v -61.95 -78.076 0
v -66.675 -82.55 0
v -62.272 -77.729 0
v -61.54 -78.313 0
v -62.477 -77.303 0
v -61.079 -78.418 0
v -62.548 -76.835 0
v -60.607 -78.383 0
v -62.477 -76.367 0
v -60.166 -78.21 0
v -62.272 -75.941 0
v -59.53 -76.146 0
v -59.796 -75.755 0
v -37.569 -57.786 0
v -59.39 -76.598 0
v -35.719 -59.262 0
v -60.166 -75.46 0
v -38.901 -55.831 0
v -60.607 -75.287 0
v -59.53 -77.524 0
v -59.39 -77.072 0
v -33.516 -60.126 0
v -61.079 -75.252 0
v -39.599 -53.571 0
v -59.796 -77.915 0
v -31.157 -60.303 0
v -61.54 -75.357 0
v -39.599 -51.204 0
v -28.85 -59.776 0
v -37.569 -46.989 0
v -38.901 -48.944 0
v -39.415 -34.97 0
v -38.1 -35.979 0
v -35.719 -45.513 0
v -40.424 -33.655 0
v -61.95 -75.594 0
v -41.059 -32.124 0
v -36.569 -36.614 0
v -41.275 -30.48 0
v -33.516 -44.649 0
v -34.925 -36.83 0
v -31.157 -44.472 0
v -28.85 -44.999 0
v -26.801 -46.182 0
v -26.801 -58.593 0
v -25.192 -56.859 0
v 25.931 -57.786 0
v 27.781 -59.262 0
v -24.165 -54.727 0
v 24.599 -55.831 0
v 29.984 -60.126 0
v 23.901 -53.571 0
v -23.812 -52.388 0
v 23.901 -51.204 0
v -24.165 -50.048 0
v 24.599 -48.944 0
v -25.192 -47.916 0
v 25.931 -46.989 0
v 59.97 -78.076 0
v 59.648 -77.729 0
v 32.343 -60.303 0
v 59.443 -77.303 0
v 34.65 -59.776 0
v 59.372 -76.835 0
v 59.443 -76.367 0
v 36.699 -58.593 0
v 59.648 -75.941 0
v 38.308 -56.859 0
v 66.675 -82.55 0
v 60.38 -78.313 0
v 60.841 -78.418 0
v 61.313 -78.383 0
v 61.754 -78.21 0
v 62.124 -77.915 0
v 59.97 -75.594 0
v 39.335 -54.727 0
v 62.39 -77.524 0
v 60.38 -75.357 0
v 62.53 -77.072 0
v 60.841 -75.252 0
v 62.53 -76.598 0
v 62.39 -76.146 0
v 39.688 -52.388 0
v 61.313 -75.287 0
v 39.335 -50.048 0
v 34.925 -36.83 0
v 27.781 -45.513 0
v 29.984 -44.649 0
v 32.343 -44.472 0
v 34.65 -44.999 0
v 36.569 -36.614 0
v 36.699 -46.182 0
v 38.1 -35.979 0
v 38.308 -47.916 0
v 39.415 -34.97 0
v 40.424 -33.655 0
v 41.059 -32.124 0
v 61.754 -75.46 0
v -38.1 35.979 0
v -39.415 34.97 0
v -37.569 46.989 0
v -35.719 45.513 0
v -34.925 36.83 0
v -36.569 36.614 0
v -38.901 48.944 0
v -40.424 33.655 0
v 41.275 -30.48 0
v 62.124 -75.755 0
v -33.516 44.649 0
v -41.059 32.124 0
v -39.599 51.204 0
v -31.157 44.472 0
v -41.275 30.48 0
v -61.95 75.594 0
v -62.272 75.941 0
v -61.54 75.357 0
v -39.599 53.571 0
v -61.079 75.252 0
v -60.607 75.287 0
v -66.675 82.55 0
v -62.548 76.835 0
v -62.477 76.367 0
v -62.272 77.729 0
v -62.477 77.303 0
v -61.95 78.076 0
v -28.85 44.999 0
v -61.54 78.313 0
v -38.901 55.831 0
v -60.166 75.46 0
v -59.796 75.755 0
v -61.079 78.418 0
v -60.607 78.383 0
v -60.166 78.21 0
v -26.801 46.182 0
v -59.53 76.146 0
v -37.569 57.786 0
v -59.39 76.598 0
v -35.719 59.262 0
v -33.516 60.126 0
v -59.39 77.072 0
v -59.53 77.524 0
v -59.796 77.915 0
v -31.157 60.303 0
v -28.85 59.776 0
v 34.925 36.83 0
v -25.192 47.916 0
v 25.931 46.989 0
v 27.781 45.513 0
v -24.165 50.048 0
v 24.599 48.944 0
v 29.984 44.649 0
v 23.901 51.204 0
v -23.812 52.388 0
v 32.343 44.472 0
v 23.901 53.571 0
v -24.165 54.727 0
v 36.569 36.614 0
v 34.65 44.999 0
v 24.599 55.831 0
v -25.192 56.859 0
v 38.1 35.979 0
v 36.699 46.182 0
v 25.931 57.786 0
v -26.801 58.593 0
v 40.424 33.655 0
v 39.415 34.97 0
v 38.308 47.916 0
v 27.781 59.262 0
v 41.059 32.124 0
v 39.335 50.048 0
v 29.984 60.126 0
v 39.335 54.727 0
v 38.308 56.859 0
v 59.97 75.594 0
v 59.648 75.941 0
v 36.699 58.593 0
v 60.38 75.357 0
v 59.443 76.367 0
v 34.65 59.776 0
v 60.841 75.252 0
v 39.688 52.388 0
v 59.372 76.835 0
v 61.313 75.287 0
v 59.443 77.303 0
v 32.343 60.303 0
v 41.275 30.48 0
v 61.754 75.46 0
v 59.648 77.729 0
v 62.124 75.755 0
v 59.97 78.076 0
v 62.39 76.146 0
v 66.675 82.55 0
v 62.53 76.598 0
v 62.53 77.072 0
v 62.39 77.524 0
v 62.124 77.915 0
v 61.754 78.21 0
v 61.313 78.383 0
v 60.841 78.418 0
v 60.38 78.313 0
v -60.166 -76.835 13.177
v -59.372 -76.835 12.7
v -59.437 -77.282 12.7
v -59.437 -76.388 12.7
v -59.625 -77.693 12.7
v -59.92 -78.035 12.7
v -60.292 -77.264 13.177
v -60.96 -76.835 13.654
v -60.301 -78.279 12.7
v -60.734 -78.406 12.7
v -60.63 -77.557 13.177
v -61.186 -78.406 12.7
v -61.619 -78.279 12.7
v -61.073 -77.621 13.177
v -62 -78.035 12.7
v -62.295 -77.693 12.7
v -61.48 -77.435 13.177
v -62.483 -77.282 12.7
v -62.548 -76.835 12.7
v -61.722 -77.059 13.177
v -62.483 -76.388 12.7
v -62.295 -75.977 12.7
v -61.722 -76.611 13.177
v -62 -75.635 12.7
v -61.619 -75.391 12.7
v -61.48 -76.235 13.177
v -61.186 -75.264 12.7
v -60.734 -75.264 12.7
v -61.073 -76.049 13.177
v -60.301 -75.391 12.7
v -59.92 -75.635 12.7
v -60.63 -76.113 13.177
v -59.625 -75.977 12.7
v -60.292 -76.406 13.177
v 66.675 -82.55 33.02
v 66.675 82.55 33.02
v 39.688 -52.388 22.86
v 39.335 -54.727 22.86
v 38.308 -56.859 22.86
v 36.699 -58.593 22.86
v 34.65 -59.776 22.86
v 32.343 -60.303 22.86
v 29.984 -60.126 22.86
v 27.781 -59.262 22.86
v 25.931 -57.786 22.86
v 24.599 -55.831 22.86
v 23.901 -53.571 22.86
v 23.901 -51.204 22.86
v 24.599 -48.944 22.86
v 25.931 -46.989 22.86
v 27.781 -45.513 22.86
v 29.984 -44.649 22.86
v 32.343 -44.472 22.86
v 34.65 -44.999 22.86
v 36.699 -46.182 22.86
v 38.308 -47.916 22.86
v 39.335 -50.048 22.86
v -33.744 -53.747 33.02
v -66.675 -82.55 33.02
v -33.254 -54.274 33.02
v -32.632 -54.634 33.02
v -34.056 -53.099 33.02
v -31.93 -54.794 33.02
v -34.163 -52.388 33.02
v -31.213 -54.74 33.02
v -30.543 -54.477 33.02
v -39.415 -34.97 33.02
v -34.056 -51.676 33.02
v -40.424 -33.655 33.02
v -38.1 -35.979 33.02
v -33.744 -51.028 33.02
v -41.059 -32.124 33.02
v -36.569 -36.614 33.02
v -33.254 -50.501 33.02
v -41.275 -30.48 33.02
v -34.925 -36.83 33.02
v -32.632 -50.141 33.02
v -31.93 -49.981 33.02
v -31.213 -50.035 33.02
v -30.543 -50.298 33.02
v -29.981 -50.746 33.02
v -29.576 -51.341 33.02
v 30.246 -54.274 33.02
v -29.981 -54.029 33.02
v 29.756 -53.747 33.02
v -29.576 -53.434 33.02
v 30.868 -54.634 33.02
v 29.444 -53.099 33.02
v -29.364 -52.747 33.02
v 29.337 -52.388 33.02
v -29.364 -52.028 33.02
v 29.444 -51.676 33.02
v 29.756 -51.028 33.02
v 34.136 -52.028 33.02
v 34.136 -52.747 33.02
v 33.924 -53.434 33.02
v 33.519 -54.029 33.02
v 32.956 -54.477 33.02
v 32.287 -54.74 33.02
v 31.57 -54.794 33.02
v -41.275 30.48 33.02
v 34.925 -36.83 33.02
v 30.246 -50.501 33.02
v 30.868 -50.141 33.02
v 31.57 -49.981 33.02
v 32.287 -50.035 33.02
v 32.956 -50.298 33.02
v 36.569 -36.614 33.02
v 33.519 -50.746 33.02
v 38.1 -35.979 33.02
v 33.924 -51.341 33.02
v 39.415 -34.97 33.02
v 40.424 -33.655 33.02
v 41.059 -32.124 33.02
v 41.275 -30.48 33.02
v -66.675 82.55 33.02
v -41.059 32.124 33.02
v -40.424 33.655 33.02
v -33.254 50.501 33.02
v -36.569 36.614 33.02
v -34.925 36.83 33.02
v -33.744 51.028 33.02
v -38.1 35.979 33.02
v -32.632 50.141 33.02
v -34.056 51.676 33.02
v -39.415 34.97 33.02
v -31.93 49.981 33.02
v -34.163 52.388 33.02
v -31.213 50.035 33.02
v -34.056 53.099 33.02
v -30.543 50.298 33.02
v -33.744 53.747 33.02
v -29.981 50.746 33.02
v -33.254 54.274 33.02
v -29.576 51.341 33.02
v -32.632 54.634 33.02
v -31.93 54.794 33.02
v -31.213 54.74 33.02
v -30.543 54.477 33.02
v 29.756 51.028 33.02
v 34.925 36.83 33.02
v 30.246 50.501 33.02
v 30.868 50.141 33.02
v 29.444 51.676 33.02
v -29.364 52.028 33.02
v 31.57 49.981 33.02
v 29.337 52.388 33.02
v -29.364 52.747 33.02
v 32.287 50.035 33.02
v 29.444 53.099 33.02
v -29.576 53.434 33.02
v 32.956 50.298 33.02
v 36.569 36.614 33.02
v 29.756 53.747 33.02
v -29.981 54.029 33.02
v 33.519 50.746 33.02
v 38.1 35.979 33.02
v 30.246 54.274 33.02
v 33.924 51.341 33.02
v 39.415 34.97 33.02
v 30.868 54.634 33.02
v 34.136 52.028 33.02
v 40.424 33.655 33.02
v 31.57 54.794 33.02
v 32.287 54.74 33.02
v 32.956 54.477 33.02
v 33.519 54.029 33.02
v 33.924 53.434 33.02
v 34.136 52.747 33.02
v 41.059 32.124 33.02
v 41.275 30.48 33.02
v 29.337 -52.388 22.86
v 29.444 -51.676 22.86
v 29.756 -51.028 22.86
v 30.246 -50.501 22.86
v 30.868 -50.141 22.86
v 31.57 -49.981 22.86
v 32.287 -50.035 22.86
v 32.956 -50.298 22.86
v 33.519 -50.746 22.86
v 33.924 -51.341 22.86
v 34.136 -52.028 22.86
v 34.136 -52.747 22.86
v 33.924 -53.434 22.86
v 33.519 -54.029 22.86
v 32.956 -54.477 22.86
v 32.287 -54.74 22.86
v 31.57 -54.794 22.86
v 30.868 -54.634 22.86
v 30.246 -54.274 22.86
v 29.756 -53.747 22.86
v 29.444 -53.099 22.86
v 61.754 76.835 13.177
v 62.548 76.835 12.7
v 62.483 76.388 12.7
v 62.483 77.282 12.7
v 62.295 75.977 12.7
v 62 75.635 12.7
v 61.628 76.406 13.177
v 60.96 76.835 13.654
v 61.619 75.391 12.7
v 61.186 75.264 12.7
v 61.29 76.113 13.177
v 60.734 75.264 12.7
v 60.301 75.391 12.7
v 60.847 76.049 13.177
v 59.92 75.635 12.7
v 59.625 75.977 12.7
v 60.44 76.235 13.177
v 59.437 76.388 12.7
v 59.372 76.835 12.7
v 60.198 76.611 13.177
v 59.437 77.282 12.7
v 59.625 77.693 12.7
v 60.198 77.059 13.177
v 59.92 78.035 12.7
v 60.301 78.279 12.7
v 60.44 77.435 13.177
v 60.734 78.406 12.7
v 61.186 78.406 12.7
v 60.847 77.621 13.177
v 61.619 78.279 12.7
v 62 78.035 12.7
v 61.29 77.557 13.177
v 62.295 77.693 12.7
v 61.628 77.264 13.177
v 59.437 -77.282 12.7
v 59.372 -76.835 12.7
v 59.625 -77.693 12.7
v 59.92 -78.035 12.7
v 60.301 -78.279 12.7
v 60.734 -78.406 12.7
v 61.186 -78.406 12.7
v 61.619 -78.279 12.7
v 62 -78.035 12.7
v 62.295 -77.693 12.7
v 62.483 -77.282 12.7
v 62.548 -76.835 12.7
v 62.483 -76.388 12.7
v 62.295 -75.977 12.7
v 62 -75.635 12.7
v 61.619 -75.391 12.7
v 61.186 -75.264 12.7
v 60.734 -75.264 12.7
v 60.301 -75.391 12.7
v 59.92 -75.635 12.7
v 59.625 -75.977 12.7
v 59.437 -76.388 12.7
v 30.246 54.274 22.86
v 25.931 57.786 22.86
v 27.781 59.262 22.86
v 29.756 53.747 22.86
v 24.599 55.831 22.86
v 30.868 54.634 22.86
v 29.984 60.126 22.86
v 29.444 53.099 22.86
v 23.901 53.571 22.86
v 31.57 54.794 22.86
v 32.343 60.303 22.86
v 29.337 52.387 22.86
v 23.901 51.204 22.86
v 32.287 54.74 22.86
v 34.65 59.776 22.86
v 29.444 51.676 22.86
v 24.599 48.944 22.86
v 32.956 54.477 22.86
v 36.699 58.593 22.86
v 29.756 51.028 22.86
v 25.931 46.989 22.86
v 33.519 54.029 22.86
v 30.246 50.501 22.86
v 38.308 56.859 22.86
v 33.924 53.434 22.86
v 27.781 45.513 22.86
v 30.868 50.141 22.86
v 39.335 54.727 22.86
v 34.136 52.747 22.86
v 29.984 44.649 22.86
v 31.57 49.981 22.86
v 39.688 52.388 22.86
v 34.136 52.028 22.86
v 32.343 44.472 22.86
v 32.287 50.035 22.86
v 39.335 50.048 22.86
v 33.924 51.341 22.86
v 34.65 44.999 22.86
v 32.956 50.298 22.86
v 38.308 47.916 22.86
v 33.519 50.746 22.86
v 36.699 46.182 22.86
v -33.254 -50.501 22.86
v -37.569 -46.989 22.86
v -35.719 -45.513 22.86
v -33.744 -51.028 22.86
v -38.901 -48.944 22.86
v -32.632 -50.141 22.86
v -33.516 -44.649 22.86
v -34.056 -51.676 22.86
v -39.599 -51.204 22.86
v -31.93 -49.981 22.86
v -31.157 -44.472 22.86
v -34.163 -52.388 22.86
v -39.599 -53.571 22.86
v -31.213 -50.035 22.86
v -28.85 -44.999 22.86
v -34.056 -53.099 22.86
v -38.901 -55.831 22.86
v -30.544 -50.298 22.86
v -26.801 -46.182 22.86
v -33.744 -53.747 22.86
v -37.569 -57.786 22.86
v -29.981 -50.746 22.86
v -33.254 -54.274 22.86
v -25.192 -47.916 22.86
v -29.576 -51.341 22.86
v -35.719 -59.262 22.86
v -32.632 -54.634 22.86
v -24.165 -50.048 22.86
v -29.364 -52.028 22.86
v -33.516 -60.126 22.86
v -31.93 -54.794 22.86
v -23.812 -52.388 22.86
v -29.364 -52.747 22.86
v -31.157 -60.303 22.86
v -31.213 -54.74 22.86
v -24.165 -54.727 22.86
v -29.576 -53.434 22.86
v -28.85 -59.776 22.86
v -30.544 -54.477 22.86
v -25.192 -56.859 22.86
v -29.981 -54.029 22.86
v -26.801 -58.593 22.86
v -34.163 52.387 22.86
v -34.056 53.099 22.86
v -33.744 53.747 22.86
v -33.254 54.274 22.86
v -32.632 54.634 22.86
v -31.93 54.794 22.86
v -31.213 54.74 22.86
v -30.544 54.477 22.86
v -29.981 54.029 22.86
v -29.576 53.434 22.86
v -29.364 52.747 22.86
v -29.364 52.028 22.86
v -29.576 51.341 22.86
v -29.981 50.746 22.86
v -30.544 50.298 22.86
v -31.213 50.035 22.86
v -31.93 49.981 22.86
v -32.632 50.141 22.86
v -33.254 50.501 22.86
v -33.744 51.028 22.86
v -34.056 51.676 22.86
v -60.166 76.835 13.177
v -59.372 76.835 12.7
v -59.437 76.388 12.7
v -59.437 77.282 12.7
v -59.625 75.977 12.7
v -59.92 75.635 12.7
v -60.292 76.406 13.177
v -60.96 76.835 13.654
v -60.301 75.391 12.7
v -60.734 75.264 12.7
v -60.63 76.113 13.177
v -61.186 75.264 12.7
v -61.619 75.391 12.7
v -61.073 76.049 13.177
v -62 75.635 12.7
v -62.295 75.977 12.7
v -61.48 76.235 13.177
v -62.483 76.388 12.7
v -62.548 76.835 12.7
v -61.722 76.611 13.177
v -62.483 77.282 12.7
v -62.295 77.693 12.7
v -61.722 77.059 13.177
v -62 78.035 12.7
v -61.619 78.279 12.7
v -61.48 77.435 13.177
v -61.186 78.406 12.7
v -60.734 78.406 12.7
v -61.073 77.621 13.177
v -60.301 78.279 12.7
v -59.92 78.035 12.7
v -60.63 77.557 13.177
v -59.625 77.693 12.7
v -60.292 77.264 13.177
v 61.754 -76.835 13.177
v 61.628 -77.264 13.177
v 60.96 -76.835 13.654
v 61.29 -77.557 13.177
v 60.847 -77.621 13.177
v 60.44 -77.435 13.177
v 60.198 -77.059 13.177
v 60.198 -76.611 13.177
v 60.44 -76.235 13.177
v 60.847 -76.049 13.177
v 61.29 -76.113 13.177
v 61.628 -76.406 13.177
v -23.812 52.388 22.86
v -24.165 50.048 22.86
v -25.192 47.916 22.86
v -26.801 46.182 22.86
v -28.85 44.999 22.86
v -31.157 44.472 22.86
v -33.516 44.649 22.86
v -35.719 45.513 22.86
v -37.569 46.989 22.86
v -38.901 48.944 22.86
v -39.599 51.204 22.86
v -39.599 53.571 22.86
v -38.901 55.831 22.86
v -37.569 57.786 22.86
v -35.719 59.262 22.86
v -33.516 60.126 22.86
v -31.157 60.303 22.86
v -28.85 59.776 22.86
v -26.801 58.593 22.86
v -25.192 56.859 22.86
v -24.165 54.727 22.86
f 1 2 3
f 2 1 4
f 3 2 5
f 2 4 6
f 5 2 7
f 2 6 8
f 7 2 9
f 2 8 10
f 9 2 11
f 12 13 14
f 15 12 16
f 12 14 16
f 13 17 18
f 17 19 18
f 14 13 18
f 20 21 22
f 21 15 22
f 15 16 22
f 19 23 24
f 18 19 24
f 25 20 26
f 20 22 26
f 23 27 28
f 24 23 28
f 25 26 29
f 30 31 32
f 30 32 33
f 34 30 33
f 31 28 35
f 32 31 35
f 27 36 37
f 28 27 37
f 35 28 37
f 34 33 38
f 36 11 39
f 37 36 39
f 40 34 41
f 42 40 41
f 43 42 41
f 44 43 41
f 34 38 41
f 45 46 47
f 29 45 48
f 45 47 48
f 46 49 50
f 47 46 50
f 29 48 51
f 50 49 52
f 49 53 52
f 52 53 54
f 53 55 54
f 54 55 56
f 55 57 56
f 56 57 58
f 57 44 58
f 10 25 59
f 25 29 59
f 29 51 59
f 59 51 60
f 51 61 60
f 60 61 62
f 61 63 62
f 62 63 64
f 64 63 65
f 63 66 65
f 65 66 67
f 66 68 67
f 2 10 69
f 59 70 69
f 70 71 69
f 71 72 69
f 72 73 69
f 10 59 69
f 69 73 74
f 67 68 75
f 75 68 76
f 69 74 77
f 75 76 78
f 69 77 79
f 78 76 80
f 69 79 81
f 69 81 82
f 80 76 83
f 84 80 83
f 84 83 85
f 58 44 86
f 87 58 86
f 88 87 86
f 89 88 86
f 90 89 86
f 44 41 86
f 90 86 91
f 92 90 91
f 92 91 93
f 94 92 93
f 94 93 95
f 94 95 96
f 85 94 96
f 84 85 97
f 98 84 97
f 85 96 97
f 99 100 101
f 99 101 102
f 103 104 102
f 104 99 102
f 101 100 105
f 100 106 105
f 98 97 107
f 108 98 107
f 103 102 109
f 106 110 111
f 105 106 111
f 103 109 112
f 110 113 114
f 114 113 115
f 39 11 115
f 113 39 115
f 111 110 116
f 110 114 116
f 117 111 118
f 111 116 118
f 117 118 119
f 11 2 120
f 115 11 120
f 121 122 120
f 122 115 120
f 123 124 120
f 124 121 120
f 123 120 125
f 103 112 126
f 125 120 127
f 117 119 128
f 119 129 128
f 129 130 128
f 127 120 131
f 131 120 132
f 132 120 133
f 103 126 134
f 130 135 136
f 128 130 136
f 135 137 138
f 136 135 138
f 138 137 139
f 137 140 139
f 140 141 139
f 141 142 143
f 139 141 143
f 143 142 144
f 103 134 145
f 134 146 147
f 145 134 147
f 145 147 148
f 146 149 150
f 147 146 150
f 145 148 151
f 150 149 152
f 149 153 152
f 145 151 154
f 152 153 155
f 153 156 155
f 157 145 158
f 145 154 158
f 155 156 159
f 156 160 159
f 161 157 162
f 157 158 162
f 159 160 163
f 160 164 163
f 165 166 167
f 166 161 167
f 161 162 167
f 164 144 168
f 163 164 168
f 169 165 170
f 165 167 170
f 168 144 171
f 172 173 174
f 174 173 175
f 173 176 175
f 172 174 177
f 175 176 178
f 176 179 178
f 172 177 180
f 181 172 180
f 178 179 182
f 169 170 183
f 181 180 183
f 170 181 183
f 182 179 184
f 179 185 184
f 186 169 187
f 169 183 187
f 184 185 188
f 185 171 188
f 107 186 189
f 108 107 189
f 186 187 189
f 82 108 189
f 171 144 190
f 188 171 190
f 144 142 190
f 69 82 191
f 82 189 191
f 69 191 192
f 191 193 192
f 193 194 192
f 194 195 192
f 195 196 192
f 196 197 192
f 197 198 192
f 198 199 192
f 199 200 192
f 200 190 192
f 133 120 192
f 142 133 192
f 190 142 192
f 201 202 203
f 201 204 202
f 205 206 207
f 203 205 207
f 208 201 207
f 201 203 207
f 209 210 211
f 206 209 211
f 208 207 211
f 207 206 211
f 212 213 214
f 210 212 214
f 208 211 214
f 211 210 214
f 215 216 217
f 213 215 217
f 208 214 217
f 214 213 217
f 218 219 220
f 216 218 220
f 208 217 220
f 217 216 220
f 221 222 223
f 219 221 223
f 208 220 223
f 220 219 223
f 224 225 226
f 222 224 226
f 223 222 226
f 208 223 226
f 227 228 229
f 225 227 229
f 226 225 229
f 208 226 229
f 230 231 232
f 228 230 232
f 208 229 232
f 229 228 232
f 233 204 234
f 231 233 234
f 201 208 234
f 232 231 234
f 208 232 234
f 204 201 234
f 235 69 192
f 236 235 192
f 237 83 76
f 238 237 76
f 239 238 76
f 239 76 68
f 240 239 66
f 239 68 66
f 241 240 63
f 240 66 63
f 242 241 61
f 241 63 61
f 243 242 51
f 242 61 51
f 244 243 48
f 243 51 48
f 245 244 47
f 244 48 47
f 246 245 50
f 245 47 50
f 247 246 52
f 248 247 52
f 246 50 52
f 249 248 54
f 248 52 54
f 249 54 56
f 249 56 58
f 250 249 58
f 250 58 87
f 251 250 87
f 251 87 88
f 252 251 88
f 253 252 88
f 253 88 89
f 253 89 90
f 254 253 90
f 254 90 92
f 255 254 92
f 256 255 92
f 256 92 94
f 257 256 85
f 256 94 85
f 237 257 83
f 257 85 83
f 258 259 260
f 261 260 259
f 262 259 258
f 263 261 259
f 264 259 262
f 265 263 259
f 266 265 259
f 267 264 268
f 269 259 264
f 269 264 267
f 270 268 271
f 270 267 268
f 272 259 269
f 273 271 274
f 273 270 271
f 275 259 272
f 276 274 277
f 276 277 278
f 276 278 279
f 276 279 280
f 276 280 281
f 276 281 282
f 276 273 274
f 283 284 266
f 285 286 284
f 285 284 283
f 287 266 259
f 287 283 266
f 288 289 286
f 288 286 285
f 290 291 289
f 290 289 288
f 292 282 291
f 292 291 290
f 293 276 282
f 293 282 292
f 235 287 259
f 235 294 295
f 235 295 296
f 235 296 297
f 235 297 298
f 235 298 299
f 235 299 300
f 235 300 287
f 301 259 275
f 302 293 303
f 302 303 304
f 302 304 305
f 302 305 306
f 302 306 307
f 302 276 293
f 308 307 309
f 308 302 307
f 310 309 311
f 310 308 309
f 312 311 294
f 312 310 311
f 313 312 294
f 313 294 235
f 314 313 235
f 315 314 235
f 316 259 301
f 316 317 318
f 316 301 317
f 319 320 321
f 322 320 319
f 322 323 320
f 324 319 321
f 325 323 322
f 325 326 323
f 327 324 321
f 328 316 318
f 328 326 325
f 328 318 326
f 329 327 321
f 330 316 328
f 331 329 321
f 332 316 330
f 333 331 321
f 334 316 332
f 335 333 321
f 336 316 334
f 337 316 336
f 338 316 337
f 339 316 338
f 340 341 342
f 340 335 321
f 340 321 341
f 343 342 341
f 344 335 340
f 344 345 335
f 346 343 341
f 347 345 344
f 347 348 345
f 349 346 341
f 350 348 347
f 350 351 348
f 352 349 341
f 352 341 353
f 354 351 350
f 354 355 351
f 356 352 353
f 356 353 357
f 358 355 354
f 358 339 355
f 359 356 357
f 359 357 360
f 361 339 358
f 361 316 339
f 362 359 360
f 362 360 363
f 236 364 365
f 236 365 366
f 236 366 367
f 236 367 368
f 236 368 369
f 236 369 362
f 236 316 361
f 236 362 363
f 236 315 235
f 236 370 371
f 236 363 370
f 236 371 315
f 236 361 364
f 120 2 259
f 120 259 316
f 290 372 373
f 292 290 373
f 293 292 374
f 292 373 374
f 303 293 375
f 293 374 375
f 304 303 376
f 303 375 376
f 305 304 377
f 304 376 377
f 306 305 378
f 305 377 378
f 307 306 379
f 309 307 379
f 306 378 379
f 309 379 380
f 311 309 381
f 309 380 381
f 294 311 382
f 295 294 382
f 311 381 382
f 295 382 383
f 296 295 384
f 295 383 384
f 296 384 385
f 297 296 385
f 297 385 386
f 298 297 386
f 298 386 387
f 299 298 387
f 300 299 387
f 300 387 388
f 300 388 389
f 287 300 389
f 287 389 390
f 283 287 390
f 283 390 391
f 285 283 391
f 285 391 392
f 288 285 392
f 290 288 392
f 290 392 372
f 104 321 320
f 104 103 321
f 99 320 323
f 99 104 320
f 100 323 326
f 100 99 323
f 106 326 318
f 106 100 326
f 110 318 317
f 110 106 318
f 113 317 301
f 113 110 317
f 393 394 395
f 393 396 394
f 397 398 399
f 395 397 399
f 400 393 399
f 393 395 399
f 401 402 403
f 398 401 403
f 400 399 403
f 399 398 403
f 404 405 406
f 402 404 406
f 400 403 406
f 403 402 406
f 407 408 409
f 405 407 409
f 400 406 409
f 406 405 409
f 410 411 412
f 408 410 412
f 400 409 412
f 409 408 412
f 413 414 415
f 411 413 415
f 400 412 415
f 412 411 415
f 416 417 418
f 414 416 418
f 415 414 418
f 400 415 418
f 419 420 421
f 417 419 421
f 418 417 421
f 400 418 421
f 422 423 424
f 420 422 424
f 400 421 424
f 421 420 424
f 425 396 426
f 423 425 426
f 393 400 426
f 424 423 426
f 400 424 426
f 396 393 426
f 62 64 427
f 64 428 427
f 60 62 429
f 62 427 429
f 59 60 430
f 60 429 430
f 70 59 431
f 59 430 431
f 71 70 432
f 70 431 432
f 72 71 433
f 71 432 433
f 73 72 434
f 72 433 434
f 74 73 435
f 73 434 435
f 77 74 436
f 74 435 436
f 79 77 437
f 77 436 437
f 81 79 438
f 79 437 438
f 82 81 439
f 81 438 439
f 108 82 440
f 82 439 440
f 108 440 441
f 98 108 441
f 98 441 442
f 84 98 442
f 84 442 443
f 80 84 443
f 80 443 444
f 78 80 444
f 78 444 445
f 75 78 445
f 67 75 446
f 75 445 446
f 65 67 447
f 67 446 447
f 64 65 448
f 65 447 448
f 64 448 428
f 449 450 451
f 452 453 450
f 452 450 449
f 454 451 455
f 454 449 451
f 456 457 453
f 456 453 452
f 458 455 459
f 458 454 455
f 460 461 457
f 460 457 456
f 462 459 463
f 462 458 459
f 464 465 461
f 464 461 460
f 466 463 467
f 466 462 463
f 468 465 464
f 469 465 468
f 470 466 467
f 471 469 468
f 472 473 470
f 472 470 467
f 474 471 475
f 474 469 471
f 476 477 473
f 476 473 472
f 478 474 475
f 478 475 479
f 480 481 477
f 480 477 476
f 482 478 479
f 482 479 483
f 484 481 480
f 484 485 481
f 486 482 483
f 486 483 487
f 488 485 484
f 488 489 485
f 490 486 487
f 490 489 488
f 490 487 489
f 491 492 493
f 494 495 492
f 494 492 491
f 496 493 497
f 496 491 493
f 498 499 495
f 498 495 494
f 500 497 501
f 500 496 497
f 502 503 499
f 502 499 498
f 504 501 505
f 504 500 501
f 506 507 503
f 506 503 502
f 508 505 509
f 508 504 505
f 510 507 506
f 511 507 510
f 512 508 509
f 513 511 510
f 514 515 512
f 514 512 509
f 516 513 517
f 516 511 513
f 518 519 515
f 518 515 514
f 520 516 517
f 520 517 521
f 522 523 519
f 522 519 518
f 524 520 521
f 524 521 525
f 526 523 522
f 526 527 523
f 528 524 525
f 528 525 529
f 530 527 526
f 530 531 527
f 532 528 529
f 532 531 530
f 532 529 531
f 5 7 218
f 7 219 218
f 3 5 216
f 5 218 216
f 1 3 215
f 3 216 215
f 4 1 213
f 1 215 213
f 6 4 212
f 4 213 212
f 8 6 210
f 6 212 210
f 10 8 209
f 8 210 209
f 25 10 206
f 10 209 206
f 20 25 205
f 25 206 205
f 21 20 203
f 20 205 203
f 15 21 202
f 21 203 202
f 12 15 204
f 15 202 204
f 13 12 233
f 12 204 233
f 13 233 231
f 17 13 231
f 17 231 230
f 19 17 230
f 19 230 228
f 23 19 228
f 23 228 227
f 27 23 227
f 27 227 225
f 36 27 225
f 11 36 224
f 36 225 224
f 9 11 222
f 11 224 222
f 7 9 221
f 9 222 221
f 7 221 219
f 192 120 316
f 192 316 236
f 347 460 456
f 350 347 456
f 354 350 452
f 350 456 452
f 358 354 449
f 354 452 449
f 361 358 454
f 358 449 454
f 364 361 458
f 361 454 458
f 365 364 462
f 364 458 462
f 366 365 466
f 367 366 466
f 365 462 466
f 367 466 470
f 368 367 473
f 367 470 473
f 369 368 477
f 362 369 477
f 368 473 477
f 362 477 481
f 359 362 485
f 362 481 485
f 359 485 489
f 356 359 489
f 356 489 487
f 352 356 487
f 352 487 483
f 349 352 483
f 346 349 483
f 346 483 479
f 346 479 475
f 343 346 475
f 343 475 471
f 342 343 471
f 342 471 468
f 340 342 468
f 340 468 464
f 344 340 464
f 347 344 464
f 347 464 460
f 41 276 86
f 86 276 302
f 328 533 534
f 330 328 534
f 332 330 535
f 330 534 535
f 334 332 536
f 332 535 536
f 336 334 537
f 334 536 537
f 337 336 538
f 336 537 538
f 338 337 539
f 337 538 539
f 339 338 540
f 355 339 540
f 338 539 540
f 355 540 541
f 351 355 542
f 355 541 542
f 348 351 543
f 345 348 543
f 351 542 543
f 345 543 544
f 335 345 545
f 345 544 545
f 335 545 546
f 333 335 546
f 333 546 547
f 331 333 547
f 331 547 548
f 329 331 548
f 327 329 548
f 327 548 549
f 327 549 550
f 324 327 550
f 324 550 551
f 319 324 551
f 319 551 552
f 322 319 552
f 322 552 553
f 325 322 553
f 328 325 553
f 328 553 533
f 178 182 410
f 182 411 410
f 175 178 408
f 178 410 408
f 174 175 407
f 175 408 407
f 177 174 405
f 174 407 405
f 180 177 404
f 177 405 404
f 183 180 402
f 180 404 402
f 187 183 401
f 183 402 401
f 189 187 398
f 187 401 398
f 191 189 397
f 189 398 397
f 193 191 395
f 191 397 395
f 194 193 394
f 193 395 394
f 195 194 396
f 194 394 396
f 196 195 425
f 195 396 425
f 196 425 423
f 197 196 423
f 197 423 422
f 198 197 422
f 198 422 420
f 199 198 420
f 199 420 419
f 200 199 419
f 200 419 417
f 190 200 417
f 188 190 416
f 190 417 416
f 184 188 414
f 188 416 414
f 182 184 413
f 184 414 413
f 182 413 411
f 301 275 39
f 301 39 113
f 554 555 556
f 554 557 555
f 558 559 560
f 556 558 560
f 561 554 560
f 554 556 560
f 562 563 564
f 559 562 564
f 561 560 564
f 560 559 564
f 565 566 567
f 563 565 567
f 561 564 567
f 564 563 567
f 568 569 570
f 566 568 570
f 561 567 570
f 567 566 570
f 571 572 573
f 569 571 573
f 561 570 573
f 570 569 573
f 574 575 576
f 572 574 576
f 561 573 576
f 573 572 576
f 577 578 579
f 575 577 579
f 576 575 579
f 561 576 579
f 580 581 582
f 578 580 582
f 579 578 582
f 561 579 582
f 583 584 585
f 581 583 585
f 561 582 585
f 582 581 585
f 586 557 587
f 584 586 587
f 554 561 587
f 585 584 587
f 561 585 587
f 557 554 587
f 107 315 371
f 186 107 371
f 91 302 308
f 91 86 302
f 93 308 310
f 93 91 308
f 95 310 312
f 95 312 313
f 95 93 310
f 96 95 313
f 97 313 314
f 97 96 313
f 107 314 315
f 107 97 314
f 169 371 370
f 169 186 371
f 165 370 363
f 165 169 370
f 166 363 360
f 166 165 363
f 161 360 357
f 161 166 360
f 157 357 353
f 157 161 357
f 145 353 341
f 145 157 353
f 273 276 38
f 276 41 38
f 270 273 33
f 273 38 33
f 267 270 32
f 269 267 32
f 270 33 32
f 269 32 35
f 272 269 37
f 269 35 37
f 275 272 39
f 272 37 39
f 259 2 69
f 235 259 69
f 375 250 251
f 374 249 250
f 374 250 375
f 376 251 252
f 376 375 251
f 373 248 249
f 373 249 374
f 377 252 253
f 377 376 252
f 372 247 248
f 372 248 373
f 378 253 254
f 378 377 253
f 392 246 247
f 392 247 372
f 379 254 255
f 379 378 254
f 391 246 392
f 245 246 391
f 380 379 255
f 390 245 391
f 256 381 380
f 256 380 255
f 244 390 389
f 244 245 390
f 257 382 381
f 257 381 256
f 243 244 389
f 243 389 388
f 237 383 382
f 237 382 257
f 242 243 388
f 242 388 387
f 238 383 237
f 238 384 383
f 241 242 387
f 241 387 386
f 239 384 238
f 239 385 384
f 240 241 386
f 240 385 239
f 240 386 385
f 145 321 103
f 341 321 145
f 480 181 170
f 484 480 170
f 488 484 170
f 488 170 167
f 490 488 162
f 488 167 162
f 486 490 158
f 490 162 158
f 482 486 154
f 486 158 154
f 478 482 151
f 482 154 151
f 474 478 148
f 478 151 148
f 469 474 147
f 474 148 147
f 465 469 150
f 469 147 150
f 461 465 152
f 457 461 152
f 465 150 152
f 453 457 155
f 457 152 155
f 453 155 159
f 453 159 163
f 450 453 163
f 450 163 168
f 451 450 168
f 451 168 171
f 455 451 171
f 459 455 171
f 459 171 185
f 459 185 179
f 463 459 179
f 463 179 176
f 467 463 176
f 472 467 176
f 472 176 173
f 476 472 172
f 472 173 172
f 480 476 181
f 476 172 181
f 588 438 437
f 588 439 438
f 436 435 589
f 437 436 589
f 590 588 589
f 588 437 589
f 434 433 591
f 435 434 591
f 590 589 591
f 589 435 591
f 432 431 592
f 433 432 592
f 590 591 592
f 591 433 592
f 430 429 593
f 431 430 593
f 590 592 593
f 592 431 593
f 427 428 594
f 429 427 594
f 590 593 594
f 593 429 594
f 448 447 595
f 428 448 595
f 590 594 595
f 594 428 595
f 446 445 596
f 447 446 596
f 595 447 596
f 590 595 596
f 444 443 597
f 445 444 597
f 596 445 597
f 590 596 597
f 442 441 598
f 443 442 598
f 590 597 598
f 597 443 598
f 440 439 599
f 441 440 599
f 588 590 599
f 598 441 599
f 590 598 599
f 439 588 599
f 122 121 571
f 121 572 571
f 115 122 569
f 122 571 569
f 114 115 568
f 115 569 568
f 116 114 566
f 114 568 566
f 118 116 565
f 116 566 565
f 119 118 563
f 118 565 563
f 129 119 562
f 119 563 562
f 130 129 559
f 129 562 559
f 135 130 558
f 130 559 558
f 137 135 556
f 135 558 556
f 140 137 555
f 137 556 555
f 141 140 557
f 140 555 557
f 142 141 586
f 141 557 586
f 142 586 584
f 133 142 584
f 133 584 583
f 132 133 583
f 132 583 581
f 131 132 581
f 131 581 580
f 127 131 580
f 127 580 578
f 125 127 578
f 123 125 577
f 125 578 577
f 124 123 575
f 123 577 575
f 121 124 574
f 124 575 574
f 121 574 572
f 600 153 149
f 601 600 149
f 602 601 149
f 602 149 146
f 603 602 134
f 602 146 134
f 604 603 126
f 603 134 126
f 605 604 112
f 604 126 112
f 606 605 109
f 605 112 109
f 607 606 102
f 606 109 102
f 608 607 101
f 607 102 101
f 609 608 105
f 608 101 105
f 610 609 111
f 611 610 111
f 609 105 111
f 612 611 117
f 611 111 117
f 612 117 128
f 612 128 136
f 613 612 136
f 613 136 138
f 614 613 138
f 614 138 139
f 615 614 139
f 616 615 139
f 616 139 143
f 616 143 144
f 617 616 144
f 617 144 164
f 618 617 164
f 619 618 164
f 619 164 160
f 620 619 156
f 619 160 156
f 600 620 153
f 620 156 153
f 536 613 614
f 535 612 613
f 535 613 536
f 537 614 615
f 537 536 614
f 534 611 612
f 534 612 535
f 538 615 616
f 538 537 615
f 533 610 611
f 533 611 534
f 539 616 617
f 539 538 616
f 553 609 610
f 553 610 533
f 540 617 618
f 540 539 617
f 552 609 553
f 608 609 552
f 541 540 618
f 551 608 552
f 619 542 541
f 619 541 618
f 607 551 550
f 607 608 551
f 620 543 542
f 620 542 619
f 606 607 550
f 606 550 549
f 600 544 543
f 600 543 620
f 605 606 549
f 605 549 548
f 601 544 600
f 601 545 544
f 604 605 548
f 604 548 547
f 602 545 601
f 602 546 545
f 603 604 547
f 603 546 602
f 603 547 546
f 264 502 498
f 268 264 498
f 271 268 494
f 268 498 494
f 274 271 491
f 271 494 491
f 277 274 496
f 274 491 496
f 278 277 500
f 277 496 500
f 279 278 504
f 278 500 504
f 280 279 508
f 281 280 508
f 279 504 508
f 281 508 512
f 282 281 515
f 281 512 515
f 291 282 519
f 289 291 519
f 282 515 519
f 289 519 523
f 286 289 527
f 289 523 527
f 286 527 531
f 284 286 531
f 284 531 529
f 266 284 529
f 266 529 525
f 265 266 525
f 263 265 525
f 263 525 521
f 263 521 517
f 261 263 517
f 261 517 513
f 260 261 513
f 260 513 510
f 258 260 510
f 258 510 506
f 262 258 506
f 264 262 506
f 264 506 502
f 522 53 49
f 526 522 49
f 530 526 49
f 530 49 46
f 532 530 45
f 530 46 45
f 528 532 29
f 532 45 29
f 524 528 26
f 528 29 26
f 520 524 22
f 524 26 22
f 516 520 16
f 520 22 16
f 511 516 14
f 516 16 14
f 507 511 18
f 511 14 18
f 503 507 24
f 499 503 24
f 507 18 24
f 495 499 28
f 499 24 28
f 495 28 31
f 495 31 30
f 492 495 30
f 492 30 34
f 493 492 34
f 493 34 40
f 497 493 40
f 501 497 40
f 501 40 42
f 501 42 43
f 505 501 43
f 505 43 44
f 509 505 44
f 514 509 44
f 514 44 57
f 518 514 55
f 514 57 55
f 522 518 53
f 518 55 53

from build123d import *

# Parameters (mm, degrees)
F0_W      = 133.35
F0_H      = 165.1
F1_DEPTH  = 33.02
F2_W      = 82.55
F2_H      = 73.66
F3_DEPTH  = 33.021
F4_R      = 6.35
F6_D      = 4.826
F7_R      = 7.9375
F7_R_2    = 2.413
F8_DEPTH  = 22.86
F10_D     = 3.175
F10_DEPTH = 12.7
F10_TIP   = 0.9538662327


with BuildPart() as f1:
    # F0 (on Top) → F1 (new body)
    with BuildSketch(Plane.XY):
        Rectangle(F0_W, F0_H)
    extrude(amount=F1_DEPTH)

    # F2 (on face) → F3 (cut, through all)
    with BuildSketch(Plane.XY.offset(33.02)):
        Rectangle(F2_W, F2_H)
    extrude(amount=-F3_DEPTH, mode=Mode.SUBTRACT)

    # F4
    f4_edges = [f1.edges().sort_by_distance(p)[0] for p in [
        (-41.275, 36.83, 16.51),
        (-41.275, -36.83, 16.51),
        (41.275, -36.83, 16.51),
        (41.275, 36.83, 16.51),
    ]]
    fillet(f4_edges, radius=F4_R)

    # F6 (through all)
    with Locations(Plane.XY.offset(33.02)):
        with Locations((-31.75, 52.3875), (31.75, 52.3875), (31.75, -52.3875), (-31.75, -52.3875)):
            Hole(F6_D / 2)

    # F7 (on face) → F8 (cut)
    with BuildSketch(Plane(origin=(0, 0, 0), x_dir=(1, 0, 0), z_dir=(0, 0, -1))):
        with Locations((-31.75, 52.3875)):
            Circle(F7_R)
        with Locations((-31.75, 52.3875)):
            Circle(F7_R_2, mode=Mode.SUBTRACT)
        with Locations((31.75, 52.3875)):
            Circle(F7_R)
        with Locations((31.75, 52.3875)):
            Circle(F7_R_2, mode=Mode.SUBTRACT)
        with Locations((31.75, -52.3875)):
            Circle(F7_R)
        with Locations((31.75, -52.3875)):
            Circle(F7_R_2, mode=Mode.SUBTRACT)
        with Locations((-31.75, -52.3875)):
            Circle(F7_R)
        with Locations((-31.75, -52.3875)):
            Circle(F7_R_2, mode=Mode.SUBTRACT)
    extrude(amount=-F8_DEPTH, mode=Mode.SUBTRACT)

    # F10
    with Locations(Plane(origin=(0, 0, 0), x_dir=(1, 0, 0), z_dir=(0, 0, -1))):
        with Locations((-60.96, 76.835), (60.96, 76.835), (60.96, -76.835), (-60.96, -76.835)):
            Hole(F10_D / 2, depth=F10_DEPTH)
            with Locations((0, 0, -(F10_DEPTH + F10_TIP / 2))):  # 118° drill point
                Cone(0, F10_D / 2, F10_TIP, mode=Mode.SUBTRACT)


solid = f1.part
